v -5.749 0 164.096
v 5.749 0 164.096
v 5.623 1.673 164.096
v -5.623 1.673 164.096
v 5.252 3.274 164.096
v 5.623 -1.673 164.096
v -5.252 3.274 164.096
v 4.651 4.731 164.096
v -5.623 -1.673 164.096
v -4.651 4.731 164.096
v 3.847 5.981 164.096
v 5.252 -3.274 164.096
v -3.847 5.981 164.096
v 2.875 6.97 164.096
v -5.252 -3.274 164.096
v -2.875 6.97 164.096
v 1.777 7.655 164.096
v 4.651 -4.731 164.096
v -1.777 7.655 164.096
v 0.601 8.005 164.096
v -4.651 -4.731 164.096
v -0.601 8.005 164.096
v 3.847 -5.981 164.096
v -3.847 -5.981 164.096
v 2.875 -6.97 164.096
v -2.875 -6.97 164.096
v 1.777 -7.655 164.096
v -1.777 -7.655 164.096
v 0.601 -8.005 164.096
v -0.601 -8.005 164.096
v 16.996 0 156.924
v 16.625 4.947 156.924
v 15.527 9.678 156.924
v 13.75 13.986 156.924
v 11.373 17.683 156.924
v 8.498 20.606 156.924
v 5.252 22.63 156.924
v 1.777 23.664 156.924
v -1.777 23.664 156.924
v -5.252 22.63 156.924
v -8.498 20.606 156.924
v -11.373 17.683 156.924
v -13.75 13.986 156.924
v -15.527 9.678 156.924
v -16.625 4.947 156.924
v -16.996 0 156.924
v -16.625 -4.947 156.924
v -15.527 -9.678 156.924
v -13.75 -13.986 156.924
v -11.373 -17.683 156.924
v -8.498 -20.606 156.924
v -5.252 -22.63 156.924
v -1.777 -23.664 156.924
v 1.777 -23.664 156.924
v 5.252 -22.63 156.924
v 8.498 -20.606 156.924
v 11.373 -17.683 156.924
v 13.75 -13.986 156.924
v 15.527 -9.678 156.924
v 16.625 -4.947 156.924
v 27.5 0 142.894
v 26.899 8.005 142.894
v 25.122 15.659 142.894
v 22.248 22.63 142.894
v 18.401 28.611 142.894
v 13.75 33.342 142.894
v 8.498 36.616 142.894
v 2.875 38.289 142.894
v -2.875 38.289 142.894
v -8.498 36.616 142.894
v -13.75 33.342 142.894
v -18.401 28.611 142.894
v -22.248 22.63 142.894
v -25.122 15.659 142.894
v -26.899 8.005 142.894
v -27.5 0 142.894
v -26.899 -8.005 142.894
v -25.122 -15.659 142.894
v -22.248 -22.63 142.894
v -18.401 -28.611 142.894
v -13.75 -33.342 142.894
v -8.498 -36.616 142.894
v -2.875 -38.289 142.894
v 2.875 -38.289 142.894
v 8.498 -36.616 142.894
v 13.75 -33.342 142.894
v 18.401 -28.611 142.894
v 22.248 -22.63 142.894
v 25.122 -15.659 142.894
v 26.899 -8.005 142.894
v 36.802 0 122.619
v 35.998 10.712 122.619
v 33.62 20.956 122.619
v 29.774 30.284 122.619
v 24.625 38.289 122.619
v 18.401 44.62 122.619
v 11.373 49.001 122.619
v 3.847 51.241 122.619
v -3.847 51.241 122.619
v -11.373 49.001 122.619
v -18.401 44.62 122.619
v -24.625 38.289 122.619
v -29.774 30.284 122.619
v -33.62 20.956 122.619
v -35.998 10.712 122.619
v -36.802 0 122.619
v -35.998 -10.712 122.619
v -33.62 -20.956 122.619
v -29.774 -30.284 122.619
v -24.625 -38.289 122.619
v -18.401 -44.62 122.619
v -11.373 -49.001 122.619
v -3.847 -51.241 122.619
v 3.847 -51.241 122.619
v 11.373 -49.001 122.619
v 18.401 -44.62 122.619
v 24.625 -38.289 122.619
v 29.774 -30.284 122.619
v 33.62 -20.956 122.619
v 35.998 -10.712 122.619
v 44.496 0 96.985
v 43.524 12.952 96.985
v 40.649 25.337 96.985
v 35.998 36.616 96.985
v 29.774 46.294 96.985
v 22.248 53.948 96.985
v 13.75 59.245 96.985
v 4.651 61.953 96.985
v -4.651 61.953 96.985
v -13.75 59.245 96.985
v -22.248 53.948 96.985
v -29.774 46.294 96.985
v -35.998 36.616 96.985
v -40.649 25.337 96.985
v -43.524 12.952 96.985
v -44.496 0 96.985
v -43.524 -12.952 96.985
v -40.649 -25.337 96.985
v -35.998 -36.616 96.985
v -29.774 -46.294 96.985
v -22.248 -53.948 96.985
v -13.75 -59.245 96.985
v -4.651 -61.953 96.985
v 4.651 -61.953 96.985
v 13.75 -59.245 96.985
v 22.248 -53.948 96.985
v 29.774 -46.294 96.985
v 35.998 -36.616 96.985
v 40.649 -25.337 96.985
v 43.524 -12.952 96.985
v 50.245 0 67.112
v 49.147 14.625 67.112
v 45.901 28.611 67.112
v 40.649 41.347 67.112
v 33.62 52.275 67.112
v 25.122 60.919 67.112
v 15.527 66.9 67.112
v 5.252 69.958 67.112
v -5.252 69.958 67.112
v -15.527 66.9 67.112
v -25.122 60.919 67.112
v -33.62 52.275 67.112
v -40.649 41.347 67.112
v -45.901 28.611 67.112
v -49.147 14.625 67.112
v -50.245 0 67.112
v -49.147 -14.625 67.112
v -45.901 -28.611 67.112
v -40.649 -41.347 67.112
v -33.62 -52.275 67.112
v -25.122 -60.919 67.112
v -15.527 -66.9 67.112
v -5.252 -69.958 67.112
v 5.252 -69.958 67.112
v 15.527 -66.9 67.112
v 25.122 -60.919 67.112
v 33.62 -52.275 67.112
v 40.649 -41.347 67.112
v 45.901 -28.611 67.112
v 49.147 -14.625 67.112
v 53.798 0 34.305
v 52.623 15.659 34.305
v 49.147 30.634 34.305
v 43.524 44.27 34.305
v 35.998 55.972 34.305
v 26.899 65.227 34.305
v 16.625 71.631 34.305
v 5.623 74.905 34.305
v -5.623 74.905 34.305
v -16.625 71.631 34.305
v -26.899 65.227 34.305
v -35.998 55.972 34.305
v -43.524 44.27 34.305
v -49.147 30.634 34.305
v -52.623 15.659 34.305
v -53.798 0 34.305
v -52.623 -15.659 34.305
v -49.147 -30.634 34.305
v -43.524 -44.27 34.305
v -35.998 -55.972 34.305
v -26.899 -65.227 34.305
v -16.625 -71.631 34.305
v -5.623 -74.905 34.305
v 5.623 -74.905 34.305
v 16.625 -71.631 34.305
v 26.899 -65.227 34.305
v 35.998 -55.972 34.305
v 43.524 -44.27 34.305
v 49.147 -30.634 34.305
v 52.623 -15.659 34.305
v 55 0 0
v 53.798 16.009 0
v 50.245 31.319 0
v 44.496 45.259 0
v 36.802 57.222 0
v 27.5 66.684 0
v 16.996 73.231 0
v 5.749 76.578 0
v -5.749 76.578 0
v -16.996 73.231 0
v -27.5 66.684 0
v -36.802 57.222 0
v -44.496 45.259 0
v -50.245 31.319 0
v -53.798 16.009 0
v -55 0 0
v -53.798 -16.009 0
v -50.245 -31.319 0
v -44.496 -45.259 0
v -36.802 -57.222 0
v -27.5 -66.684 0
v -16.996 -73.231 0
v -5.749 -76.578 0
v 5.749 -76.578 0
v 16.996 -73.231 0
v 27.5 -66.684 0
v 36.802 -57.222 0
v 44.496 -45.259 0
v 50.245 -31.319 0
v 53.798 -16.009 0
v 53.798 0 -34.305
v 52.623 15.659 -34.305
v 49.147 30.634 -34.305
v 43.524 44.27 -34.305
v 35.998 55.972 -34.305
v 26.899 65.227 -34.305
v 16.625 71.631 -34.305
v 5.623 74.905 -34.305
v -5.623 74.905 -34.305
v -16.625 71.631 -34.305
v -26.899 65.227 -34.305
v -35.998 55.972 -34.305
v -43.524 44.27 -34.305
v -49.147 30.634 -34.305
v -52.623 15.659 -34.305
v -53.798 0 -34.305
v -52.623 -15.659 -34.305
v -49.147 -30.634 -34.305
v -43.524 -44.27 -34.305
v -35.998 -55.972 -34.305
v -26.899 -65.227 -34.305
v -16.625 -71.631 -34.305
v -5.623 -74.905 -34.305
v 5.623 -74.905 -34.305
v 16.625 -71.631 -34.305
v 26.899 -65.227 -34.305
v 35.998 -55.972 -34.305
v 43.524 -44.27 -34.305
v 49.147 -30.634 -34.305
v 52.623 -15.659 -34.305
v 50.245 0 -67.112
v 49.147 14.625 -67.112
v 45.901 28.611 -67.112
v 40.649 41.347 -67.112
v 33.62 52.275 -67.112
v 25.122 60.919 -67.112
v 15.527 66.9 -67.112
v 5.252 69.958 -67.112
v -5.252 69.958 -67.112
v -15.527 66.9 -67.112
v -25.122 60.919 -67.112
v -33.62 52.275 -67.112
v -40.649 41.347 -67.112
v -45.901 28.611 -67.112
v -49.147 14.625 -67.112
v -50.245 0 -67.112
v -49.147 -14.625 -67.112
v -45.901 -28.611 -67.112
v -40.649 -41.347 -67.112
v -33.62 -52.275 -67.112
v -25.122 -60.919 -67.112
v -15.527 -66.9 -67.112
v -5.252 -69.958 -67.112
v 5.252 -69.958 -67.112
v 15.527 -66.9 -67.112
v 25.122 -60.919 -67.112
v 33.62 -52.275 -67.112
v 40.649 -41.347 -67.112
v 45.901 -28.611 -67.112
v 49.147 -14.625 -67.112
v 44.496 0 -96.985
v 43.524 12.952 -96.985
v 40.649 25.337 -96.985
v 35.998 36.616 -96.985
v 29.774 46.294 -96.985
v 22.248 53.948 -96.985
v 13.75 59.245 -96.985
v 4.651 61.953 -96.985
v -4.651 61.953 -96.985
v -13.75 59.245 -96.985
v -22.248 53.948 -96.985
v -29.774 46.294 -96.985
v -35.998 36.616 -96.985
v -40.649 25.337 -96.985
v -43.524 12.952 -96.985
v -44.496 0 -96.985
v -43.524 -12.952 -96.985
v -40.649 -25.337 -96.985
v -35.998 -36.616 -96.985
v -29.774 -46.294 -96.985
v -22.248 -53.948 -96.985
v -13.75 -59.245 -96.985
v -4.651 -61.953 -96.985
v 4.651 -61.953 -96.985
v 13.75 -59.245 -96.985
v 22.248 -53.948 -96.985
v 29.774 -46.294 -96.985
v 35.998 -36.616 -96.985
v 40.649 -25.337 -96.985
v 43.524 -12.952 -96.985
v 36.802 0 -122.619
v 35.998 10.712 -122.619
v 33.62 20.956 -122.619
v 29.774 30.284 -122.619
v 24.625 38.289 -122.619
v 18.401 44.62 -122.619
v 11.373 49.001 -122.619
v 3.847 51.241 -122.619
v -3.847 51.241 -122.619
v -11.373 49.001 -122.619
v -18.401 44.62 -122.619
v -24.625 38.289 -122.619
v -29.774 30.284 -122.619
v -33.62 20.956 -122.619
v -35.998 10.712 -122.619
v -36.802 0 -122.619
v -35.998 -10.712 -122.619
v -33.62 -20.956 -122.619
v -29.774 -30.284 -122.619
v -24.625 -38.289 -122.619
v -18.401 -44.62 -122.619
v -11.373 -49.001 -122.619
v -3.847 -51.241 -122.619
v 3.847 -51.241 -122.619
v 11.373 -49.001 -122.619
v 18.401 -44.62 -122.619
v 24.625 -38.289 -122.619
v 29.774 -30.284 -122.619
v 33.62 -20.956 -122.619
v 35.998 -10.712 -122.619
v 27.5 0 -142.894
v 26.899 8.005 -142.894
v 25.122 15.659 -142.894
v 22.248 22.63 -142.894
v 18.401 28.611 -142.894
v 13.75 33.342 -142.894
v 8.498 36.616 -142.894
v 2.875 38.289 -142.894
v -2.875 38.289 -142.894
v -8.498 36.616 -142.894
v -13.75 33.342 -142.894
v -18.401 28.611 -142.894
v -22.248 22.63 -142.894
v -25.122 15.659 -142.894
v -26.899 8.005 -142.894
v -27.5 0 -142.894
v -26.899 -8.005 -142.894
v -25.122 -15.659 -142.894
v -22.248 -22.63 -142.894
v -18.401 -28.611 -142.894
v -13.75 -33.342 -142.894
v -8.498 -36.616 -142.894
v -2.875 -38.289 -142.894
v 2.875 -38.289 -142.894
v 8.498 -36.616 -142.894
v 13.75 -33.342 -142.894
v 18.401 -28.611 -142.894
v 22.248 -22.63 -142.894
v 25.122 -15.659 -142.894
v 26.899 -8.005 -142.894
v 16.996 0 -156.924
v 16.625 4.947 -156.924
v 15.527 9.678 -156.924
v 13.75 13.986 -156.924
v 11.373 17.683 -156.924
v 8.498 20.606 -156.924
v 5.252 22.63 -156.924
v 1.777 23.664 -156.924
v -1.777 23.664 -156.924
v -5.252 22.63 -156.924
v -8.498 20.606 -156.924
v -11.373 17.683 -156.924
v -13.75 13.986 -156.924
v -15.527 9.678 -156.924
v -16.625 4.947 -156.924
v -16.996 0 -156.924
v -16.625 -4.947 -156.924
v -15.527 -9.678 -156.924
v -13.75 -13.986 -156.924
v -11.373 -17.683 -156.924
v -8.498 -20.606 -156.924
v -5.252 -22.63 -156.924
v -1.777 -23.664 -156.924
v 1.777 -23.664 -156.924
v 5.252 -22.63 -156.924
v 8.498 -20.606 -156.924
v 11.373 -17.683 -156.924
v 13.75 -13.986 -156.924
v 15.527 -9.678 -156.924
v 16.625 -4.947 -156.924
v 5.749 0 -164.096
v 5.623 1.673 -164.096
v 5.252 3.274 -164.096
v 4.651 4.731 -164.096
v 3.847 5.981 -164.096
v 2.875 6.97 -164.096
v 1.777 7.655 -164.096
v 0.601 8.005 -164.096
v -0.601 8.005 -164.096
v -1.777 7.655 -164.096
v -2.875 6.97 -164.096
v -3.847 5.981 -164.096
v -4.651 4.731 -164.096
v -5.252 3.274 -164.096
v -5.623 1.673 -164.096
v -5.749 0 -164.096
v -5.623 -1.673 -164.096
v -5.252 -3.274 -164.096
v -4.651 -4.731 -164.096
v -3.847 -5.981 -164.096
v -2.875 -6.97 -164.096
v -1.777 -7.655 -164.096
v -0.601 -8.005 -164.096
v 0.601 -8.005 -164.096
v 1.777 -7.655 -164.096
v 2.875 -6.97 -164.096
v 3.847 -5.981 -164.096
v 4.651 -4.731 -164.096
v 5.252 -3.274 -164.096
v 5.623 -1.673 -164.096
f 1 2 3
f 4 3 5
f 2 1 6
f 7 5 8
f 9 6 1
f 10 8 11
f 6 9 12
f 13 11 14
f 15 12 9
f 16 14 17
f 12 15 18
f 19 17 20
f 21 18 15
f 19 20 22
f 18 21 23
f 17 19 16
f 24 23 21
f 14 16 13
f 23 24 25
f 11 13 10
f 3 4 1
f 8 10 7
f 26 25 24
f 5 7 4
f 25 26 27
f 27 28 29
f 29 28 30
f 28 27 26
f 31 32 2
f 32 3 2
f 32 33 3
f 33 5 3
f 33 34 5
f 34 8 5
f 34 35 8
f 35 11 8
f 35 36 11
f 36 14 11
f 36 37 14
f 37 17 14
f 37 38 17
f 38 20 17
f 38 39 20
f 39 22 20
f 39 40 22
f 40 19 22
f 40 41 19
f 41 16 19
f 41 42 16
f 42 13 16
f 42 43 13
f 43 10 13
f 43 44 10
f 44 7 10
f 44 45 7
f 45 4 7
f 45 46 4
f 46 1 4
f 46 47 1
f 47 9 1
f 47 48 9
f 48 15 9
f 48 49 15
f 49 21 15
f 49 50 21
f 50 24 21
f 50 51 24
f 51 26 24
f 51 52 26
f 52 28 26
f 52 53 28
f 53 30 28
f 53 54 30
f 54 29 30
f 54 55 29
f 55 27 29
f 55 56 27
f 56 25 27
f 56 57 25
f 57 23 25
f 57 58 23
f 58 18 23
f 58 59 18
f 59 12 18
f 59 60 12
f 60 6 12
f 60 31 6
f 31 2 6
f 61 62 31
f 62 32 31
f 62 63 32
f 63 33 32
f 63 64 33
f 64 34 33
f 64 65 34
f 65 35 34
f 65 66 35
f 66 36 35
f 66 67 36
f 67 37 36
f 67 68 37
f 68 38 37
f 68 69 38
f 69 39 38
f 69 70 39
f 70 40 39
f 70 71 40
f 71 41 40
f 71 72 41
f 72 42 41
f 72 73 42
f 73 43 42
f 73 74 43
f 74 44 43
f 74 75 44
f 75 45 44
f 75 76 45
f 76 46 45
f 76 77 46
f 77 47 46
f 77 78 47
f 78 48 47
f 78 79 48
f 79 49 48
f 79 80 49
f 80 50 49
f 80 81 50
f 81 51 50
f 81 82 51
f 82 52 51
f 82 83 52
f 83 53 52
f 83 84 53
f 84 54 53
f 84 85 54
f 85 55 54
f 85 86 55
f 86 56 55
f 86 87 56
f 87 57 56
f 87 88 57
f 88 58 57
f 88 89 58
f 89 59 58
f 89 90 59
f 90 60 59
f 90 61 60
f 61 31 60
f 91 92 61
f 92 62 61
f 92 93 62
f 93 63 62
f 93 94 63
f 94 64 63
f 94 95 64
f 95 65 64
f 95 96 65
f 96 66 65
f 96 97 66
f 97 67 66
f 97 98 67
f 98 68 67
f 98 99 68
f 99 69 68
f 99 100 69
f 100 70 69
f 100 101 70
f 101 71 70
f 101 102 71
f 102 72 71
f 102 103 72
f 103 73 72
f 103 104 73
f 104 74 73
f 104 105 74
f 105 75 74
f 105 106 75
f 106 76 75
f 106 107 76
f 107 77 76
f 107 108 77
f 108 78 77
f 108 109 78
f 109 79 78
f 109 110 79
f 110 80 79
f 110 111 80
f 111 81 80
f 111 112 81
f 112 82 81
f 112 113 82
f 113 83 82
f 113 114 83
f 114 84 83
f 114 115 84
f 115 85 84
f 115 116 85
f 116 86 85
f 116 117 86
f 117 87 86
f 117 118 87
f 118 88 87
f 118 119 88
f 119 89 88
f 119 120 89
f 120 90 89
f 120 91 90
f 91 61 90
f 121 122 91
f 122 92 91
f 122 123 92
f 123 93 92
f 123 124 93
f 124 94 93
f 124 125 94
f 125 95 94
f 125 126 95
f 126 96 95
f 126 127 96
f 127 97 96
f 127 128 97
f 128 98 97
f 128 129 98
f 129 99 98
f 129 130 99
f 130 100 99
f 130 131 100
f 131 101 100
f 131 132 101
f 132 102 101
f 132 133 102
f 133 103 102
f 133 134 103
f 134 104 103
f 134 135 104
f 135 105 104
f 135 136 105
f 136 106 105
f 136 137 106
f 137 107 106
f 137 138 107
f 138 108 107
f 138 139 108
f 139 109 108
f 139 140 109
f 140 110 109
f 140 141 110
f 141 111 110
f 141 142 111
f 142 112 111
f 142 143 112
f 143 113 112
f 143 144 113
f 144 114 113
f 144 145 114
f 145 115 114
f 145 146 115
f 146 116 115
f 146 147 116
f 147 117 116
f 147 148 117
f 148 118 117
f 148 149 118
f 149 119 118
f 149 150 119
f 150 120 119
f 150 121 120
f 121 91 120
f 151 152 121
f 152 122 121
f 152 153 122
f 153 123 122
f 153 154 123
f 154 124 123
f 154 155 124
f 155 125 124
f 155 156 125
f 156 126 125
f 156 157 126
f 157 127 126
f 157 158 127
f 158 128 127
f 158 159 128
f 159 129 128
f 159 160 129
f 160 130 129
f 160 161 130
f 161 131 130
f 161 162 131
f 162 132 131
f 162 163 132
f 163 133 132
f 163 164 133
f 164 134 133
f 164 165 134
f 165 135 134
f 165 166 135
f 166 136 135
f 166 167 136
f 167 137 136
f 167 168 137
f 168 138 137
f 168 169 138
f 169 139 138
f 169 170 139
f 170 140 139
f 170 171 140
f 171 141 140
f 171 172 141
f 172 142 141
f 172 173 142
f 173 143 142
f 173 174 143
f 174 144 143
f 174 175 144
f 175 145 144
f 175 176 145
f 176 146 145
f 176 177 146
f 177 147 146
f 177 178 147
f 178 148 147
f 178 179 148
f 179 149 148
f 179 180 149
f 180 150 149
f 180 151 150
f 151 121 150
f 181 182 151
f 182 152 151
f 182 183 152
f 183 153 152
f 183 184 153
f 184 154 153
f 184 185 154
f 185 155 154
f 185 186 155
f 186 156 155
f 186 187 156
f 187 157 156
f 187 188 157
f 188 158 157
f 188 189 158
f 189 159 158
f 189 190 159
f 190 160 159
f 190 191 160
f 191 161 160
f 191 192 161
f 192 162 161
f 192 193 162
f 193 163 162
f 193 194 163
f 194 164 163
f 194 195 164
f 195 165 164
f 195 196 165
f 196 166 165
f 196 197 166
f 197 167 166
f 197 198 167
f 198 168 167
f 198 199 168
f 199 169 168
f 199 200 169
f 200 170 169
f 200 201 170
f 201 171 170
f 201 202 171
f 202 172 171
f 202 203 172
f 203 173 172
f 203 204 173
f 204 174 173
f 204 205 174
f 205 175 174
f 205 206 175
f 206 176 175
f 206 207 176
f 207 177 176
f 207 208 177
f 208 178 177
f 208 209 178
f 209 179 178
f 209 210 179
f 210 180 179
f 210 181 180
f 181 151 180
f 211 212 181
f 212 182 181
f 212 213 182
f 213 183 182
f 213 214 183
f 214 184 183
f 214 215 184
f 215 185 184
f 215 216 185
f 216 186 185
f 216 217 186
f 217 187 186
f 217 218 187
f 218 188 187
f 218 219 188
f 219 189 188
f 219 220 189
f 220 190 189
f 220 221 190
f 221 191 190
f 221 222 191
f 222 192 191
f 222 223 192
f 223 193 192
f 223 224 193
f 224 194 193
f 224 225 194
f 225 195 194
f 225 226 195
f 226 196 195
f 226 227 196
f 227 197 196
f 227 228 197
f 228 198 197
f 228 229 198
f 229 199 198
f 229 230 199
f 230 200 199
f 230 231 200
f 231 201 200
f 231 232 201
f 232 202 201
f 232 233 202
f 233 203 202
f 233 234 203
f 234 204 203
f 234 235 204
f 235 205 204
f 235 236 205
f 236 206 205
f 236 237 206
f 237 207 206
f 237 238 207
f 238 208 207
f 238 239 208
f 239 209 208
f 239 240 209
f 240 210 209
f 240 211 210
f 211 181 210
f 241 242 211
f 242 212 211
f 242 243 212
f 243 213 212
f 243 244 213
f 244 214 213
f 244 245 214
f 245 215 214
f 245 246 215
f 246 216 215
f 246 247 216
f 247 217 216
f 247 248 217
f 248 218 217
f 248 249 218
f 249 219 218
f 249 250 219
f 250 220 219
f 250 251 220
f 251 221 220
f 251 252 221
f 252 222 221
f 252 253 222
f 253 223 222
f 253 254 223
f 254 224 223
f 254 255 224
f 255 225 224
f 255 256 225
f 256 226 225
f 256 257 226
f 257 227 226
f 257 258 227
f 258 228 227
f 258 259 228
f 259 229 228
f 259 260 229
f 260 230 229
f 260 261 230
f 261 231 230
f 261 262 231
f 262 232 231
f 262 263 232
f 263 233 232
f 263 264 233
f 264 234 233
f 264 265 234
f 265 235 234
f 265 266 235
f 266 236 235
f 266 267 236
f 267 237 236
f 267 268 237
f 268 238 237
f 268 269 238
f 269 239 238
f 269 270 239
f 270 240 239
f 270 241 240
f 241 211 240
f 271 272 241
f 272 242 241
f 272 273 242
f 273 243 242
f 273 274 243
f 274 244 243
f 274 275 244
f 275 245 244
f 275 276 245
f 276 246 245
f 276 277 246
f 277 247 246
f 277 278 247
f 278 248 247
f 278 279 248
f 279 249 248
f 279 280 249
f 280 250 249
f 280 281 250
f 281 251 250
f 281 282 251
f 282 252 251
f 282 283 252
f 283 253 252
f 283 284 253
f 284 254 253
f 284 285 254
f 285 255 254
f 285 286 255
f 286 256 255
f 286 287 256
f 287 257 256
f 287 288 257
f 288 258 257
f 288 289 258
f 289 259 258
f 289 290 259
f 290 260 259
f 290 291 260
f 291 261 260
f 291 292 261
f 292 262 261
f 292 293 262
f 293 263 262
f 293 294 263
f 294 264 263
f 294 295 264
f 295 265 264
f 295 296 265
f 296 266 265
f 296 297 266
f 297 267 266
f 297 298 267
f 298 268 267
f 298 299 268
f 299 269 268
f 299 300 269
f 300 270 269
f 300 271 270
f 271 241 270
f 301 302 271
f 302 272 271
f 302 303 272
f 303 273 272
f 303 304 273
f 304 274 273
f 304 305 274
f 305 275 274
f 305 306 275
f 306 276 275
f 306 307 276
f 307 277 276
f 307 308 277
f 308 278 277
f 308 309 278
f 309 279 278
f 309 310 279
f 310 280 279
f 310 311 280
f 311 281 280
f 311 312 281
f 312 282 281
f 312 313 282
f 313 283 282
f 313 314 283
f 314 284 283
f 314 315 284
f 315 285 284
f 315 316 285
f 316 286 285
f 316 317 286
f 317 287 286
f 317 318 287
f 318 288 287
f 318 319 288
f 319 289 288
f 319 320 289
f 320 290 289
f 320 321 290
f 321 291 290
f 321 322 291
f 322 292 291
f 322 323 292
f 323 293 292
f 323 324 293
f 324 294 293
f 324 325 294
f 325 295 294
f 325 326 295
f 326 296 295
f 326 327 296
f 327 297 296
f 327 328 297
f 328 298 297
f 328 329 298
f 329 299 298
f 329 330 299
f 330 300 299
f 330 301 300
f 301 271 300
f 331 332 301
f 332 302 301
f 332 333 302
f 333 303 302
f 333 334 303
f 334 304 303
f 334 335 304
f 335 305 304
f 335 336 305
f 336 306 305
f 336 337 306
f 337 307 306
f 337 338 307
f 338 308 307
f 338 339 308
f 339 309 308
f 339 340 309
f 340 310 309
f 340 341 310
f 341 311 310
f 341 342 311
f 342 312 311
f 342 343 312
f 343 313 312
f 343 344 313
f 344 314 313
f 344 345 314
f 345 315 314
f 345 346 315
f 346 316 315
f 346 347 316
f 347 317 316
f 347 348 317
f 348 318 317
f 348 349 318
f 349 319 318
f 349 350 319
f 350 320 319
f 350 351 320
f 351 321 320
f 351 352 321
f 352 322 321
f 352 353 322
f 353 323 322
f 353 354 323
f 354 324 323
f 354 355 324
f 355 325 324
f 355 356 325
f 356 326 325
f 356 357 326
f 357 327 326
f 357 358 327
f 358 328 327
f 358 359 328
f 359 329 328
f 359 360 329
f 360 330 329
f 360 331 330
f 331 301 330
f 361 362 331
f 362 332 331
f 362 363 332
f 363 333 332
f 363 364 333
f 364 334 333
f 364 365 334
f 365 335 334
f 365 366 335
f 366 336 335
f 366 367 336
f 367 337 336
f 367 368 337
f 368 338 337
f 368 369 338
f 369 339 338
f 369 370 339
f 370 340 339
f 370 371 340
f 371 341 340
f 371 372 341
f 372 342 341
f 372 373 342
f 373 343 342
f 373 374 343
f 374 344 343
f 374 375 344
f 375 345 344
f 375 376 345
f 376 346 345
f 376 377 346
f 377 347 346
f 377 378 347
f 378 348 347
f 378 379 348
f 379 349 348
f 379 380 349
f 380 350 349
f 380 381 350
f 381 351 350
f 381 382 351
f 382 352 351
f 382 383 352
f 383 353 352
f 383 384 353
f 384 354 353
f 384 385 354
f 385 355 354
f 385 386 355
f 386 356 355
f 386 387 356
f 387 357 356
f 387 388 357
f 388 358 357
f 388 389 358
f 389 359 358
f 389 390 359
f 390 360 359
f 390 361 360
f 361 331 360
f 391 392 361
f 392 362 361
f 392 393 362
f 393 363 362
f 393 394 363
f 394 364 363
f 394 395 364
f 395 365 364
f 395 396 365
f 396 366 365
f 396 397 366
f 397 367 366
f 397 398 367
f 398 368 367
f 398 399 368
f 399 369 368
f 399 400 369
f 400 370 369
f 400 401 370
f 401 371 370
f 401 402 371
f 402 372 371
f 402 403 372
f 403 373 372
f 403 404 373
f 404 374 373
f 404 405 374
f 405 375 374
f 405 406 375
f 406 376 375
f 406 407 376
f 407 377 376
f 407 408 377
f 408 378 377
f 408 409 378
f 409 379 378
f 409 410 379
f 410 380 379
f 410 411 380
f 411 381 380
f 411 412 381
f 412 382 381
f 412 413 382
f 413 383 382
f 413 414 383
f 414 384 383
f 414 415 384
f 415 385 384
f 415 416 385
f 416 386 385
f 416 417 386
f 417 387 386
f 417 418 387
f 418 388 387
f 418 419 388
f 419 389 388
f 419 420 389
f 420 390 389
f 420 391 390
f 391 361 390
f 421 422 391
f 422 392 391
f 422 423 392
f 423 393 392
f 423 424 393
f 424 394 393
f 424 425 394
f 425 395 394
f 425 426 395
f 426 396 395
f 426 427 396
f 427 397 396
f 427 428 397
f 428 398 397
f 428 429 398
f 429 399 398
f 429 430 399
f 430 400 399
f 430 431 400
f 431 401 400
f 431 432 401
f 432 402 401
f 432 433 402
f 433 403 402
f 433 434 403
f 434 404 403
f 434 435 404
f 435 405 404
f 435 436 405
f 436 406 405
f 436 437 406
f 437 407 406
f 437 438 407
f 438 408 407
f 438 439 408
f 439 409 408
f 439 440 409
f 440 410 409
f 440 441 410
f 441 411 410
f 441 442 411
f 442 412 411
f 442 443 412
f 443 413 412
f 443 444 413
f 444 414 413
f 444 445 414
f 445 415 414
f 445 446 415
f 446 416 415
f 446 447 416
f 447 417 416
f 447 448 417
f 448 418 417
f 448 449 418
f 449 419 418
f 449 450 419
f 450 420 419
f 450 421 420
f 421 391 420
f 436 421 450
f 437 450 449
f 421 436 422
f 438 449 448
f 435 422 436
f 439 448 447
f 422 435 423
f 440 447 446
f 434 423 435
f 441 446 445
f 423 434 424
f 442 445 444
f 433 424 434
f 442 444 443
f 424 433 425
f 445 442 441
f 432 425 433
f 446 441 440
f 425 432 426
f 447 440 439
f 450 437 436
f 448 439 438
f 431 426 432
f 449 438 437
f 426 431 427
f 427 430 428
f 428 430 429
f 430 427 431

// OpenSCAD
// Generated by SolidPython 1.0.1 on 2020-07-29 00:46:46


scale(v = [5, 7, 15]) {
	sphere(r = 11);
}
/***********************************************
*********      SolidPython code:      **********
************************************************
 
# import packages: SolidPython
from solid import *
from solid.utils import *
from itertools import chain, combinations, permutations


class Resize:

    def __init__(self, scad_file):
        self.scad_file = scad_file
        #self.scad_file = import_scad(scad_file)
        # cone/cylinder param:
        self.r1 = 0
        self.r2 = 0
        self.h = 0
        # rectangular prism param:
        self.w = 0
        self.l = 0
        # ellipse param:
        self.r = 0

    # import OpenScad code (file name corresponds to shape)


    # classify shape + parameters
    def assign(self, param1, param2, param3):
        if self.scad_file == 'cone.scad':
            self.r1 = param1
            self.r2 = param2
            self.h = param3
        elif self.scad_file == 'cylinder.scad':
            self.r1 = param1
            self.r2 = param2
            self.h = param3
        elif self.scad_file == 'rectangularPrism.scad':
            self.h = param1
            self.l = param2
            self.w = param3
        else:
            self.r = param1
            self.h = param2

    # resize parameters
    def iterate(self):
        x = range(3, 20, 2)
        i = 1
        if self.scad_file == 'cone.scad':
            tempList = list(permutations(x, 2))
            for temp in tempList:
                param1 = temp[0]
                param2 = temp[1]
                filepath = 'produced_scad_files/' + 'cone' + str(param1) + '_' + str(param2) + '_' + '.scad'
                scad_render_to_file(cylinder(h=param1, r1=param2, r2=0), filepath)

        elif self.scad_file == 'cylinder.scad':
            tempList = list(permutations(x, 3))
            for temp in tempList:
                param1 = temp[0]
                param2 = temp[1]
                filepath = 'produced_scad_files/' + 'cylinder' + str(param1) + '_' + str(param2) + '_' + '.scad'
                scad_render_to_file(cylinder(h=param1, r1=param2, r2=param2), filepath)

        elif self.scad_file == 'rectangularPrism.scad':
            tempList = list(permutations(x, 3))
            for temp in tempList:
                param1 = temp[0]
                param2 = temp[1]
                param3 = temp[2]
                filepath = 'produced_scad_files/' + 'rectangularPrism' + str(param1) + '_' + str(param2) + '_' + str(
                    param3) + '.scad'
                scad_render_to_file(cube(size=(param1, param2, param3)), filepath)

        elif self.scad_file == 'ellipse.scad':
            tempList = list(permutations(x, 4))
            for temp in tempList:
                param1 = temp[0]
                param2 = temp[1]
                param3 = temp[2]
                param4 = temp[3]
                filepath = 'produced_scad_files/' + 'ellipse' + str(param1) + '_' + str(param2) + '_' + str(param3) + '_' + str(param4) + '.scad'
                scad_render_to_file(scale([param1, param2, param3])(sphere(r=param4)), filepath)

    def render_to_scadfile(self):
        scad_render_to_file(scad, 'example.scad') 
 
************************************************/
